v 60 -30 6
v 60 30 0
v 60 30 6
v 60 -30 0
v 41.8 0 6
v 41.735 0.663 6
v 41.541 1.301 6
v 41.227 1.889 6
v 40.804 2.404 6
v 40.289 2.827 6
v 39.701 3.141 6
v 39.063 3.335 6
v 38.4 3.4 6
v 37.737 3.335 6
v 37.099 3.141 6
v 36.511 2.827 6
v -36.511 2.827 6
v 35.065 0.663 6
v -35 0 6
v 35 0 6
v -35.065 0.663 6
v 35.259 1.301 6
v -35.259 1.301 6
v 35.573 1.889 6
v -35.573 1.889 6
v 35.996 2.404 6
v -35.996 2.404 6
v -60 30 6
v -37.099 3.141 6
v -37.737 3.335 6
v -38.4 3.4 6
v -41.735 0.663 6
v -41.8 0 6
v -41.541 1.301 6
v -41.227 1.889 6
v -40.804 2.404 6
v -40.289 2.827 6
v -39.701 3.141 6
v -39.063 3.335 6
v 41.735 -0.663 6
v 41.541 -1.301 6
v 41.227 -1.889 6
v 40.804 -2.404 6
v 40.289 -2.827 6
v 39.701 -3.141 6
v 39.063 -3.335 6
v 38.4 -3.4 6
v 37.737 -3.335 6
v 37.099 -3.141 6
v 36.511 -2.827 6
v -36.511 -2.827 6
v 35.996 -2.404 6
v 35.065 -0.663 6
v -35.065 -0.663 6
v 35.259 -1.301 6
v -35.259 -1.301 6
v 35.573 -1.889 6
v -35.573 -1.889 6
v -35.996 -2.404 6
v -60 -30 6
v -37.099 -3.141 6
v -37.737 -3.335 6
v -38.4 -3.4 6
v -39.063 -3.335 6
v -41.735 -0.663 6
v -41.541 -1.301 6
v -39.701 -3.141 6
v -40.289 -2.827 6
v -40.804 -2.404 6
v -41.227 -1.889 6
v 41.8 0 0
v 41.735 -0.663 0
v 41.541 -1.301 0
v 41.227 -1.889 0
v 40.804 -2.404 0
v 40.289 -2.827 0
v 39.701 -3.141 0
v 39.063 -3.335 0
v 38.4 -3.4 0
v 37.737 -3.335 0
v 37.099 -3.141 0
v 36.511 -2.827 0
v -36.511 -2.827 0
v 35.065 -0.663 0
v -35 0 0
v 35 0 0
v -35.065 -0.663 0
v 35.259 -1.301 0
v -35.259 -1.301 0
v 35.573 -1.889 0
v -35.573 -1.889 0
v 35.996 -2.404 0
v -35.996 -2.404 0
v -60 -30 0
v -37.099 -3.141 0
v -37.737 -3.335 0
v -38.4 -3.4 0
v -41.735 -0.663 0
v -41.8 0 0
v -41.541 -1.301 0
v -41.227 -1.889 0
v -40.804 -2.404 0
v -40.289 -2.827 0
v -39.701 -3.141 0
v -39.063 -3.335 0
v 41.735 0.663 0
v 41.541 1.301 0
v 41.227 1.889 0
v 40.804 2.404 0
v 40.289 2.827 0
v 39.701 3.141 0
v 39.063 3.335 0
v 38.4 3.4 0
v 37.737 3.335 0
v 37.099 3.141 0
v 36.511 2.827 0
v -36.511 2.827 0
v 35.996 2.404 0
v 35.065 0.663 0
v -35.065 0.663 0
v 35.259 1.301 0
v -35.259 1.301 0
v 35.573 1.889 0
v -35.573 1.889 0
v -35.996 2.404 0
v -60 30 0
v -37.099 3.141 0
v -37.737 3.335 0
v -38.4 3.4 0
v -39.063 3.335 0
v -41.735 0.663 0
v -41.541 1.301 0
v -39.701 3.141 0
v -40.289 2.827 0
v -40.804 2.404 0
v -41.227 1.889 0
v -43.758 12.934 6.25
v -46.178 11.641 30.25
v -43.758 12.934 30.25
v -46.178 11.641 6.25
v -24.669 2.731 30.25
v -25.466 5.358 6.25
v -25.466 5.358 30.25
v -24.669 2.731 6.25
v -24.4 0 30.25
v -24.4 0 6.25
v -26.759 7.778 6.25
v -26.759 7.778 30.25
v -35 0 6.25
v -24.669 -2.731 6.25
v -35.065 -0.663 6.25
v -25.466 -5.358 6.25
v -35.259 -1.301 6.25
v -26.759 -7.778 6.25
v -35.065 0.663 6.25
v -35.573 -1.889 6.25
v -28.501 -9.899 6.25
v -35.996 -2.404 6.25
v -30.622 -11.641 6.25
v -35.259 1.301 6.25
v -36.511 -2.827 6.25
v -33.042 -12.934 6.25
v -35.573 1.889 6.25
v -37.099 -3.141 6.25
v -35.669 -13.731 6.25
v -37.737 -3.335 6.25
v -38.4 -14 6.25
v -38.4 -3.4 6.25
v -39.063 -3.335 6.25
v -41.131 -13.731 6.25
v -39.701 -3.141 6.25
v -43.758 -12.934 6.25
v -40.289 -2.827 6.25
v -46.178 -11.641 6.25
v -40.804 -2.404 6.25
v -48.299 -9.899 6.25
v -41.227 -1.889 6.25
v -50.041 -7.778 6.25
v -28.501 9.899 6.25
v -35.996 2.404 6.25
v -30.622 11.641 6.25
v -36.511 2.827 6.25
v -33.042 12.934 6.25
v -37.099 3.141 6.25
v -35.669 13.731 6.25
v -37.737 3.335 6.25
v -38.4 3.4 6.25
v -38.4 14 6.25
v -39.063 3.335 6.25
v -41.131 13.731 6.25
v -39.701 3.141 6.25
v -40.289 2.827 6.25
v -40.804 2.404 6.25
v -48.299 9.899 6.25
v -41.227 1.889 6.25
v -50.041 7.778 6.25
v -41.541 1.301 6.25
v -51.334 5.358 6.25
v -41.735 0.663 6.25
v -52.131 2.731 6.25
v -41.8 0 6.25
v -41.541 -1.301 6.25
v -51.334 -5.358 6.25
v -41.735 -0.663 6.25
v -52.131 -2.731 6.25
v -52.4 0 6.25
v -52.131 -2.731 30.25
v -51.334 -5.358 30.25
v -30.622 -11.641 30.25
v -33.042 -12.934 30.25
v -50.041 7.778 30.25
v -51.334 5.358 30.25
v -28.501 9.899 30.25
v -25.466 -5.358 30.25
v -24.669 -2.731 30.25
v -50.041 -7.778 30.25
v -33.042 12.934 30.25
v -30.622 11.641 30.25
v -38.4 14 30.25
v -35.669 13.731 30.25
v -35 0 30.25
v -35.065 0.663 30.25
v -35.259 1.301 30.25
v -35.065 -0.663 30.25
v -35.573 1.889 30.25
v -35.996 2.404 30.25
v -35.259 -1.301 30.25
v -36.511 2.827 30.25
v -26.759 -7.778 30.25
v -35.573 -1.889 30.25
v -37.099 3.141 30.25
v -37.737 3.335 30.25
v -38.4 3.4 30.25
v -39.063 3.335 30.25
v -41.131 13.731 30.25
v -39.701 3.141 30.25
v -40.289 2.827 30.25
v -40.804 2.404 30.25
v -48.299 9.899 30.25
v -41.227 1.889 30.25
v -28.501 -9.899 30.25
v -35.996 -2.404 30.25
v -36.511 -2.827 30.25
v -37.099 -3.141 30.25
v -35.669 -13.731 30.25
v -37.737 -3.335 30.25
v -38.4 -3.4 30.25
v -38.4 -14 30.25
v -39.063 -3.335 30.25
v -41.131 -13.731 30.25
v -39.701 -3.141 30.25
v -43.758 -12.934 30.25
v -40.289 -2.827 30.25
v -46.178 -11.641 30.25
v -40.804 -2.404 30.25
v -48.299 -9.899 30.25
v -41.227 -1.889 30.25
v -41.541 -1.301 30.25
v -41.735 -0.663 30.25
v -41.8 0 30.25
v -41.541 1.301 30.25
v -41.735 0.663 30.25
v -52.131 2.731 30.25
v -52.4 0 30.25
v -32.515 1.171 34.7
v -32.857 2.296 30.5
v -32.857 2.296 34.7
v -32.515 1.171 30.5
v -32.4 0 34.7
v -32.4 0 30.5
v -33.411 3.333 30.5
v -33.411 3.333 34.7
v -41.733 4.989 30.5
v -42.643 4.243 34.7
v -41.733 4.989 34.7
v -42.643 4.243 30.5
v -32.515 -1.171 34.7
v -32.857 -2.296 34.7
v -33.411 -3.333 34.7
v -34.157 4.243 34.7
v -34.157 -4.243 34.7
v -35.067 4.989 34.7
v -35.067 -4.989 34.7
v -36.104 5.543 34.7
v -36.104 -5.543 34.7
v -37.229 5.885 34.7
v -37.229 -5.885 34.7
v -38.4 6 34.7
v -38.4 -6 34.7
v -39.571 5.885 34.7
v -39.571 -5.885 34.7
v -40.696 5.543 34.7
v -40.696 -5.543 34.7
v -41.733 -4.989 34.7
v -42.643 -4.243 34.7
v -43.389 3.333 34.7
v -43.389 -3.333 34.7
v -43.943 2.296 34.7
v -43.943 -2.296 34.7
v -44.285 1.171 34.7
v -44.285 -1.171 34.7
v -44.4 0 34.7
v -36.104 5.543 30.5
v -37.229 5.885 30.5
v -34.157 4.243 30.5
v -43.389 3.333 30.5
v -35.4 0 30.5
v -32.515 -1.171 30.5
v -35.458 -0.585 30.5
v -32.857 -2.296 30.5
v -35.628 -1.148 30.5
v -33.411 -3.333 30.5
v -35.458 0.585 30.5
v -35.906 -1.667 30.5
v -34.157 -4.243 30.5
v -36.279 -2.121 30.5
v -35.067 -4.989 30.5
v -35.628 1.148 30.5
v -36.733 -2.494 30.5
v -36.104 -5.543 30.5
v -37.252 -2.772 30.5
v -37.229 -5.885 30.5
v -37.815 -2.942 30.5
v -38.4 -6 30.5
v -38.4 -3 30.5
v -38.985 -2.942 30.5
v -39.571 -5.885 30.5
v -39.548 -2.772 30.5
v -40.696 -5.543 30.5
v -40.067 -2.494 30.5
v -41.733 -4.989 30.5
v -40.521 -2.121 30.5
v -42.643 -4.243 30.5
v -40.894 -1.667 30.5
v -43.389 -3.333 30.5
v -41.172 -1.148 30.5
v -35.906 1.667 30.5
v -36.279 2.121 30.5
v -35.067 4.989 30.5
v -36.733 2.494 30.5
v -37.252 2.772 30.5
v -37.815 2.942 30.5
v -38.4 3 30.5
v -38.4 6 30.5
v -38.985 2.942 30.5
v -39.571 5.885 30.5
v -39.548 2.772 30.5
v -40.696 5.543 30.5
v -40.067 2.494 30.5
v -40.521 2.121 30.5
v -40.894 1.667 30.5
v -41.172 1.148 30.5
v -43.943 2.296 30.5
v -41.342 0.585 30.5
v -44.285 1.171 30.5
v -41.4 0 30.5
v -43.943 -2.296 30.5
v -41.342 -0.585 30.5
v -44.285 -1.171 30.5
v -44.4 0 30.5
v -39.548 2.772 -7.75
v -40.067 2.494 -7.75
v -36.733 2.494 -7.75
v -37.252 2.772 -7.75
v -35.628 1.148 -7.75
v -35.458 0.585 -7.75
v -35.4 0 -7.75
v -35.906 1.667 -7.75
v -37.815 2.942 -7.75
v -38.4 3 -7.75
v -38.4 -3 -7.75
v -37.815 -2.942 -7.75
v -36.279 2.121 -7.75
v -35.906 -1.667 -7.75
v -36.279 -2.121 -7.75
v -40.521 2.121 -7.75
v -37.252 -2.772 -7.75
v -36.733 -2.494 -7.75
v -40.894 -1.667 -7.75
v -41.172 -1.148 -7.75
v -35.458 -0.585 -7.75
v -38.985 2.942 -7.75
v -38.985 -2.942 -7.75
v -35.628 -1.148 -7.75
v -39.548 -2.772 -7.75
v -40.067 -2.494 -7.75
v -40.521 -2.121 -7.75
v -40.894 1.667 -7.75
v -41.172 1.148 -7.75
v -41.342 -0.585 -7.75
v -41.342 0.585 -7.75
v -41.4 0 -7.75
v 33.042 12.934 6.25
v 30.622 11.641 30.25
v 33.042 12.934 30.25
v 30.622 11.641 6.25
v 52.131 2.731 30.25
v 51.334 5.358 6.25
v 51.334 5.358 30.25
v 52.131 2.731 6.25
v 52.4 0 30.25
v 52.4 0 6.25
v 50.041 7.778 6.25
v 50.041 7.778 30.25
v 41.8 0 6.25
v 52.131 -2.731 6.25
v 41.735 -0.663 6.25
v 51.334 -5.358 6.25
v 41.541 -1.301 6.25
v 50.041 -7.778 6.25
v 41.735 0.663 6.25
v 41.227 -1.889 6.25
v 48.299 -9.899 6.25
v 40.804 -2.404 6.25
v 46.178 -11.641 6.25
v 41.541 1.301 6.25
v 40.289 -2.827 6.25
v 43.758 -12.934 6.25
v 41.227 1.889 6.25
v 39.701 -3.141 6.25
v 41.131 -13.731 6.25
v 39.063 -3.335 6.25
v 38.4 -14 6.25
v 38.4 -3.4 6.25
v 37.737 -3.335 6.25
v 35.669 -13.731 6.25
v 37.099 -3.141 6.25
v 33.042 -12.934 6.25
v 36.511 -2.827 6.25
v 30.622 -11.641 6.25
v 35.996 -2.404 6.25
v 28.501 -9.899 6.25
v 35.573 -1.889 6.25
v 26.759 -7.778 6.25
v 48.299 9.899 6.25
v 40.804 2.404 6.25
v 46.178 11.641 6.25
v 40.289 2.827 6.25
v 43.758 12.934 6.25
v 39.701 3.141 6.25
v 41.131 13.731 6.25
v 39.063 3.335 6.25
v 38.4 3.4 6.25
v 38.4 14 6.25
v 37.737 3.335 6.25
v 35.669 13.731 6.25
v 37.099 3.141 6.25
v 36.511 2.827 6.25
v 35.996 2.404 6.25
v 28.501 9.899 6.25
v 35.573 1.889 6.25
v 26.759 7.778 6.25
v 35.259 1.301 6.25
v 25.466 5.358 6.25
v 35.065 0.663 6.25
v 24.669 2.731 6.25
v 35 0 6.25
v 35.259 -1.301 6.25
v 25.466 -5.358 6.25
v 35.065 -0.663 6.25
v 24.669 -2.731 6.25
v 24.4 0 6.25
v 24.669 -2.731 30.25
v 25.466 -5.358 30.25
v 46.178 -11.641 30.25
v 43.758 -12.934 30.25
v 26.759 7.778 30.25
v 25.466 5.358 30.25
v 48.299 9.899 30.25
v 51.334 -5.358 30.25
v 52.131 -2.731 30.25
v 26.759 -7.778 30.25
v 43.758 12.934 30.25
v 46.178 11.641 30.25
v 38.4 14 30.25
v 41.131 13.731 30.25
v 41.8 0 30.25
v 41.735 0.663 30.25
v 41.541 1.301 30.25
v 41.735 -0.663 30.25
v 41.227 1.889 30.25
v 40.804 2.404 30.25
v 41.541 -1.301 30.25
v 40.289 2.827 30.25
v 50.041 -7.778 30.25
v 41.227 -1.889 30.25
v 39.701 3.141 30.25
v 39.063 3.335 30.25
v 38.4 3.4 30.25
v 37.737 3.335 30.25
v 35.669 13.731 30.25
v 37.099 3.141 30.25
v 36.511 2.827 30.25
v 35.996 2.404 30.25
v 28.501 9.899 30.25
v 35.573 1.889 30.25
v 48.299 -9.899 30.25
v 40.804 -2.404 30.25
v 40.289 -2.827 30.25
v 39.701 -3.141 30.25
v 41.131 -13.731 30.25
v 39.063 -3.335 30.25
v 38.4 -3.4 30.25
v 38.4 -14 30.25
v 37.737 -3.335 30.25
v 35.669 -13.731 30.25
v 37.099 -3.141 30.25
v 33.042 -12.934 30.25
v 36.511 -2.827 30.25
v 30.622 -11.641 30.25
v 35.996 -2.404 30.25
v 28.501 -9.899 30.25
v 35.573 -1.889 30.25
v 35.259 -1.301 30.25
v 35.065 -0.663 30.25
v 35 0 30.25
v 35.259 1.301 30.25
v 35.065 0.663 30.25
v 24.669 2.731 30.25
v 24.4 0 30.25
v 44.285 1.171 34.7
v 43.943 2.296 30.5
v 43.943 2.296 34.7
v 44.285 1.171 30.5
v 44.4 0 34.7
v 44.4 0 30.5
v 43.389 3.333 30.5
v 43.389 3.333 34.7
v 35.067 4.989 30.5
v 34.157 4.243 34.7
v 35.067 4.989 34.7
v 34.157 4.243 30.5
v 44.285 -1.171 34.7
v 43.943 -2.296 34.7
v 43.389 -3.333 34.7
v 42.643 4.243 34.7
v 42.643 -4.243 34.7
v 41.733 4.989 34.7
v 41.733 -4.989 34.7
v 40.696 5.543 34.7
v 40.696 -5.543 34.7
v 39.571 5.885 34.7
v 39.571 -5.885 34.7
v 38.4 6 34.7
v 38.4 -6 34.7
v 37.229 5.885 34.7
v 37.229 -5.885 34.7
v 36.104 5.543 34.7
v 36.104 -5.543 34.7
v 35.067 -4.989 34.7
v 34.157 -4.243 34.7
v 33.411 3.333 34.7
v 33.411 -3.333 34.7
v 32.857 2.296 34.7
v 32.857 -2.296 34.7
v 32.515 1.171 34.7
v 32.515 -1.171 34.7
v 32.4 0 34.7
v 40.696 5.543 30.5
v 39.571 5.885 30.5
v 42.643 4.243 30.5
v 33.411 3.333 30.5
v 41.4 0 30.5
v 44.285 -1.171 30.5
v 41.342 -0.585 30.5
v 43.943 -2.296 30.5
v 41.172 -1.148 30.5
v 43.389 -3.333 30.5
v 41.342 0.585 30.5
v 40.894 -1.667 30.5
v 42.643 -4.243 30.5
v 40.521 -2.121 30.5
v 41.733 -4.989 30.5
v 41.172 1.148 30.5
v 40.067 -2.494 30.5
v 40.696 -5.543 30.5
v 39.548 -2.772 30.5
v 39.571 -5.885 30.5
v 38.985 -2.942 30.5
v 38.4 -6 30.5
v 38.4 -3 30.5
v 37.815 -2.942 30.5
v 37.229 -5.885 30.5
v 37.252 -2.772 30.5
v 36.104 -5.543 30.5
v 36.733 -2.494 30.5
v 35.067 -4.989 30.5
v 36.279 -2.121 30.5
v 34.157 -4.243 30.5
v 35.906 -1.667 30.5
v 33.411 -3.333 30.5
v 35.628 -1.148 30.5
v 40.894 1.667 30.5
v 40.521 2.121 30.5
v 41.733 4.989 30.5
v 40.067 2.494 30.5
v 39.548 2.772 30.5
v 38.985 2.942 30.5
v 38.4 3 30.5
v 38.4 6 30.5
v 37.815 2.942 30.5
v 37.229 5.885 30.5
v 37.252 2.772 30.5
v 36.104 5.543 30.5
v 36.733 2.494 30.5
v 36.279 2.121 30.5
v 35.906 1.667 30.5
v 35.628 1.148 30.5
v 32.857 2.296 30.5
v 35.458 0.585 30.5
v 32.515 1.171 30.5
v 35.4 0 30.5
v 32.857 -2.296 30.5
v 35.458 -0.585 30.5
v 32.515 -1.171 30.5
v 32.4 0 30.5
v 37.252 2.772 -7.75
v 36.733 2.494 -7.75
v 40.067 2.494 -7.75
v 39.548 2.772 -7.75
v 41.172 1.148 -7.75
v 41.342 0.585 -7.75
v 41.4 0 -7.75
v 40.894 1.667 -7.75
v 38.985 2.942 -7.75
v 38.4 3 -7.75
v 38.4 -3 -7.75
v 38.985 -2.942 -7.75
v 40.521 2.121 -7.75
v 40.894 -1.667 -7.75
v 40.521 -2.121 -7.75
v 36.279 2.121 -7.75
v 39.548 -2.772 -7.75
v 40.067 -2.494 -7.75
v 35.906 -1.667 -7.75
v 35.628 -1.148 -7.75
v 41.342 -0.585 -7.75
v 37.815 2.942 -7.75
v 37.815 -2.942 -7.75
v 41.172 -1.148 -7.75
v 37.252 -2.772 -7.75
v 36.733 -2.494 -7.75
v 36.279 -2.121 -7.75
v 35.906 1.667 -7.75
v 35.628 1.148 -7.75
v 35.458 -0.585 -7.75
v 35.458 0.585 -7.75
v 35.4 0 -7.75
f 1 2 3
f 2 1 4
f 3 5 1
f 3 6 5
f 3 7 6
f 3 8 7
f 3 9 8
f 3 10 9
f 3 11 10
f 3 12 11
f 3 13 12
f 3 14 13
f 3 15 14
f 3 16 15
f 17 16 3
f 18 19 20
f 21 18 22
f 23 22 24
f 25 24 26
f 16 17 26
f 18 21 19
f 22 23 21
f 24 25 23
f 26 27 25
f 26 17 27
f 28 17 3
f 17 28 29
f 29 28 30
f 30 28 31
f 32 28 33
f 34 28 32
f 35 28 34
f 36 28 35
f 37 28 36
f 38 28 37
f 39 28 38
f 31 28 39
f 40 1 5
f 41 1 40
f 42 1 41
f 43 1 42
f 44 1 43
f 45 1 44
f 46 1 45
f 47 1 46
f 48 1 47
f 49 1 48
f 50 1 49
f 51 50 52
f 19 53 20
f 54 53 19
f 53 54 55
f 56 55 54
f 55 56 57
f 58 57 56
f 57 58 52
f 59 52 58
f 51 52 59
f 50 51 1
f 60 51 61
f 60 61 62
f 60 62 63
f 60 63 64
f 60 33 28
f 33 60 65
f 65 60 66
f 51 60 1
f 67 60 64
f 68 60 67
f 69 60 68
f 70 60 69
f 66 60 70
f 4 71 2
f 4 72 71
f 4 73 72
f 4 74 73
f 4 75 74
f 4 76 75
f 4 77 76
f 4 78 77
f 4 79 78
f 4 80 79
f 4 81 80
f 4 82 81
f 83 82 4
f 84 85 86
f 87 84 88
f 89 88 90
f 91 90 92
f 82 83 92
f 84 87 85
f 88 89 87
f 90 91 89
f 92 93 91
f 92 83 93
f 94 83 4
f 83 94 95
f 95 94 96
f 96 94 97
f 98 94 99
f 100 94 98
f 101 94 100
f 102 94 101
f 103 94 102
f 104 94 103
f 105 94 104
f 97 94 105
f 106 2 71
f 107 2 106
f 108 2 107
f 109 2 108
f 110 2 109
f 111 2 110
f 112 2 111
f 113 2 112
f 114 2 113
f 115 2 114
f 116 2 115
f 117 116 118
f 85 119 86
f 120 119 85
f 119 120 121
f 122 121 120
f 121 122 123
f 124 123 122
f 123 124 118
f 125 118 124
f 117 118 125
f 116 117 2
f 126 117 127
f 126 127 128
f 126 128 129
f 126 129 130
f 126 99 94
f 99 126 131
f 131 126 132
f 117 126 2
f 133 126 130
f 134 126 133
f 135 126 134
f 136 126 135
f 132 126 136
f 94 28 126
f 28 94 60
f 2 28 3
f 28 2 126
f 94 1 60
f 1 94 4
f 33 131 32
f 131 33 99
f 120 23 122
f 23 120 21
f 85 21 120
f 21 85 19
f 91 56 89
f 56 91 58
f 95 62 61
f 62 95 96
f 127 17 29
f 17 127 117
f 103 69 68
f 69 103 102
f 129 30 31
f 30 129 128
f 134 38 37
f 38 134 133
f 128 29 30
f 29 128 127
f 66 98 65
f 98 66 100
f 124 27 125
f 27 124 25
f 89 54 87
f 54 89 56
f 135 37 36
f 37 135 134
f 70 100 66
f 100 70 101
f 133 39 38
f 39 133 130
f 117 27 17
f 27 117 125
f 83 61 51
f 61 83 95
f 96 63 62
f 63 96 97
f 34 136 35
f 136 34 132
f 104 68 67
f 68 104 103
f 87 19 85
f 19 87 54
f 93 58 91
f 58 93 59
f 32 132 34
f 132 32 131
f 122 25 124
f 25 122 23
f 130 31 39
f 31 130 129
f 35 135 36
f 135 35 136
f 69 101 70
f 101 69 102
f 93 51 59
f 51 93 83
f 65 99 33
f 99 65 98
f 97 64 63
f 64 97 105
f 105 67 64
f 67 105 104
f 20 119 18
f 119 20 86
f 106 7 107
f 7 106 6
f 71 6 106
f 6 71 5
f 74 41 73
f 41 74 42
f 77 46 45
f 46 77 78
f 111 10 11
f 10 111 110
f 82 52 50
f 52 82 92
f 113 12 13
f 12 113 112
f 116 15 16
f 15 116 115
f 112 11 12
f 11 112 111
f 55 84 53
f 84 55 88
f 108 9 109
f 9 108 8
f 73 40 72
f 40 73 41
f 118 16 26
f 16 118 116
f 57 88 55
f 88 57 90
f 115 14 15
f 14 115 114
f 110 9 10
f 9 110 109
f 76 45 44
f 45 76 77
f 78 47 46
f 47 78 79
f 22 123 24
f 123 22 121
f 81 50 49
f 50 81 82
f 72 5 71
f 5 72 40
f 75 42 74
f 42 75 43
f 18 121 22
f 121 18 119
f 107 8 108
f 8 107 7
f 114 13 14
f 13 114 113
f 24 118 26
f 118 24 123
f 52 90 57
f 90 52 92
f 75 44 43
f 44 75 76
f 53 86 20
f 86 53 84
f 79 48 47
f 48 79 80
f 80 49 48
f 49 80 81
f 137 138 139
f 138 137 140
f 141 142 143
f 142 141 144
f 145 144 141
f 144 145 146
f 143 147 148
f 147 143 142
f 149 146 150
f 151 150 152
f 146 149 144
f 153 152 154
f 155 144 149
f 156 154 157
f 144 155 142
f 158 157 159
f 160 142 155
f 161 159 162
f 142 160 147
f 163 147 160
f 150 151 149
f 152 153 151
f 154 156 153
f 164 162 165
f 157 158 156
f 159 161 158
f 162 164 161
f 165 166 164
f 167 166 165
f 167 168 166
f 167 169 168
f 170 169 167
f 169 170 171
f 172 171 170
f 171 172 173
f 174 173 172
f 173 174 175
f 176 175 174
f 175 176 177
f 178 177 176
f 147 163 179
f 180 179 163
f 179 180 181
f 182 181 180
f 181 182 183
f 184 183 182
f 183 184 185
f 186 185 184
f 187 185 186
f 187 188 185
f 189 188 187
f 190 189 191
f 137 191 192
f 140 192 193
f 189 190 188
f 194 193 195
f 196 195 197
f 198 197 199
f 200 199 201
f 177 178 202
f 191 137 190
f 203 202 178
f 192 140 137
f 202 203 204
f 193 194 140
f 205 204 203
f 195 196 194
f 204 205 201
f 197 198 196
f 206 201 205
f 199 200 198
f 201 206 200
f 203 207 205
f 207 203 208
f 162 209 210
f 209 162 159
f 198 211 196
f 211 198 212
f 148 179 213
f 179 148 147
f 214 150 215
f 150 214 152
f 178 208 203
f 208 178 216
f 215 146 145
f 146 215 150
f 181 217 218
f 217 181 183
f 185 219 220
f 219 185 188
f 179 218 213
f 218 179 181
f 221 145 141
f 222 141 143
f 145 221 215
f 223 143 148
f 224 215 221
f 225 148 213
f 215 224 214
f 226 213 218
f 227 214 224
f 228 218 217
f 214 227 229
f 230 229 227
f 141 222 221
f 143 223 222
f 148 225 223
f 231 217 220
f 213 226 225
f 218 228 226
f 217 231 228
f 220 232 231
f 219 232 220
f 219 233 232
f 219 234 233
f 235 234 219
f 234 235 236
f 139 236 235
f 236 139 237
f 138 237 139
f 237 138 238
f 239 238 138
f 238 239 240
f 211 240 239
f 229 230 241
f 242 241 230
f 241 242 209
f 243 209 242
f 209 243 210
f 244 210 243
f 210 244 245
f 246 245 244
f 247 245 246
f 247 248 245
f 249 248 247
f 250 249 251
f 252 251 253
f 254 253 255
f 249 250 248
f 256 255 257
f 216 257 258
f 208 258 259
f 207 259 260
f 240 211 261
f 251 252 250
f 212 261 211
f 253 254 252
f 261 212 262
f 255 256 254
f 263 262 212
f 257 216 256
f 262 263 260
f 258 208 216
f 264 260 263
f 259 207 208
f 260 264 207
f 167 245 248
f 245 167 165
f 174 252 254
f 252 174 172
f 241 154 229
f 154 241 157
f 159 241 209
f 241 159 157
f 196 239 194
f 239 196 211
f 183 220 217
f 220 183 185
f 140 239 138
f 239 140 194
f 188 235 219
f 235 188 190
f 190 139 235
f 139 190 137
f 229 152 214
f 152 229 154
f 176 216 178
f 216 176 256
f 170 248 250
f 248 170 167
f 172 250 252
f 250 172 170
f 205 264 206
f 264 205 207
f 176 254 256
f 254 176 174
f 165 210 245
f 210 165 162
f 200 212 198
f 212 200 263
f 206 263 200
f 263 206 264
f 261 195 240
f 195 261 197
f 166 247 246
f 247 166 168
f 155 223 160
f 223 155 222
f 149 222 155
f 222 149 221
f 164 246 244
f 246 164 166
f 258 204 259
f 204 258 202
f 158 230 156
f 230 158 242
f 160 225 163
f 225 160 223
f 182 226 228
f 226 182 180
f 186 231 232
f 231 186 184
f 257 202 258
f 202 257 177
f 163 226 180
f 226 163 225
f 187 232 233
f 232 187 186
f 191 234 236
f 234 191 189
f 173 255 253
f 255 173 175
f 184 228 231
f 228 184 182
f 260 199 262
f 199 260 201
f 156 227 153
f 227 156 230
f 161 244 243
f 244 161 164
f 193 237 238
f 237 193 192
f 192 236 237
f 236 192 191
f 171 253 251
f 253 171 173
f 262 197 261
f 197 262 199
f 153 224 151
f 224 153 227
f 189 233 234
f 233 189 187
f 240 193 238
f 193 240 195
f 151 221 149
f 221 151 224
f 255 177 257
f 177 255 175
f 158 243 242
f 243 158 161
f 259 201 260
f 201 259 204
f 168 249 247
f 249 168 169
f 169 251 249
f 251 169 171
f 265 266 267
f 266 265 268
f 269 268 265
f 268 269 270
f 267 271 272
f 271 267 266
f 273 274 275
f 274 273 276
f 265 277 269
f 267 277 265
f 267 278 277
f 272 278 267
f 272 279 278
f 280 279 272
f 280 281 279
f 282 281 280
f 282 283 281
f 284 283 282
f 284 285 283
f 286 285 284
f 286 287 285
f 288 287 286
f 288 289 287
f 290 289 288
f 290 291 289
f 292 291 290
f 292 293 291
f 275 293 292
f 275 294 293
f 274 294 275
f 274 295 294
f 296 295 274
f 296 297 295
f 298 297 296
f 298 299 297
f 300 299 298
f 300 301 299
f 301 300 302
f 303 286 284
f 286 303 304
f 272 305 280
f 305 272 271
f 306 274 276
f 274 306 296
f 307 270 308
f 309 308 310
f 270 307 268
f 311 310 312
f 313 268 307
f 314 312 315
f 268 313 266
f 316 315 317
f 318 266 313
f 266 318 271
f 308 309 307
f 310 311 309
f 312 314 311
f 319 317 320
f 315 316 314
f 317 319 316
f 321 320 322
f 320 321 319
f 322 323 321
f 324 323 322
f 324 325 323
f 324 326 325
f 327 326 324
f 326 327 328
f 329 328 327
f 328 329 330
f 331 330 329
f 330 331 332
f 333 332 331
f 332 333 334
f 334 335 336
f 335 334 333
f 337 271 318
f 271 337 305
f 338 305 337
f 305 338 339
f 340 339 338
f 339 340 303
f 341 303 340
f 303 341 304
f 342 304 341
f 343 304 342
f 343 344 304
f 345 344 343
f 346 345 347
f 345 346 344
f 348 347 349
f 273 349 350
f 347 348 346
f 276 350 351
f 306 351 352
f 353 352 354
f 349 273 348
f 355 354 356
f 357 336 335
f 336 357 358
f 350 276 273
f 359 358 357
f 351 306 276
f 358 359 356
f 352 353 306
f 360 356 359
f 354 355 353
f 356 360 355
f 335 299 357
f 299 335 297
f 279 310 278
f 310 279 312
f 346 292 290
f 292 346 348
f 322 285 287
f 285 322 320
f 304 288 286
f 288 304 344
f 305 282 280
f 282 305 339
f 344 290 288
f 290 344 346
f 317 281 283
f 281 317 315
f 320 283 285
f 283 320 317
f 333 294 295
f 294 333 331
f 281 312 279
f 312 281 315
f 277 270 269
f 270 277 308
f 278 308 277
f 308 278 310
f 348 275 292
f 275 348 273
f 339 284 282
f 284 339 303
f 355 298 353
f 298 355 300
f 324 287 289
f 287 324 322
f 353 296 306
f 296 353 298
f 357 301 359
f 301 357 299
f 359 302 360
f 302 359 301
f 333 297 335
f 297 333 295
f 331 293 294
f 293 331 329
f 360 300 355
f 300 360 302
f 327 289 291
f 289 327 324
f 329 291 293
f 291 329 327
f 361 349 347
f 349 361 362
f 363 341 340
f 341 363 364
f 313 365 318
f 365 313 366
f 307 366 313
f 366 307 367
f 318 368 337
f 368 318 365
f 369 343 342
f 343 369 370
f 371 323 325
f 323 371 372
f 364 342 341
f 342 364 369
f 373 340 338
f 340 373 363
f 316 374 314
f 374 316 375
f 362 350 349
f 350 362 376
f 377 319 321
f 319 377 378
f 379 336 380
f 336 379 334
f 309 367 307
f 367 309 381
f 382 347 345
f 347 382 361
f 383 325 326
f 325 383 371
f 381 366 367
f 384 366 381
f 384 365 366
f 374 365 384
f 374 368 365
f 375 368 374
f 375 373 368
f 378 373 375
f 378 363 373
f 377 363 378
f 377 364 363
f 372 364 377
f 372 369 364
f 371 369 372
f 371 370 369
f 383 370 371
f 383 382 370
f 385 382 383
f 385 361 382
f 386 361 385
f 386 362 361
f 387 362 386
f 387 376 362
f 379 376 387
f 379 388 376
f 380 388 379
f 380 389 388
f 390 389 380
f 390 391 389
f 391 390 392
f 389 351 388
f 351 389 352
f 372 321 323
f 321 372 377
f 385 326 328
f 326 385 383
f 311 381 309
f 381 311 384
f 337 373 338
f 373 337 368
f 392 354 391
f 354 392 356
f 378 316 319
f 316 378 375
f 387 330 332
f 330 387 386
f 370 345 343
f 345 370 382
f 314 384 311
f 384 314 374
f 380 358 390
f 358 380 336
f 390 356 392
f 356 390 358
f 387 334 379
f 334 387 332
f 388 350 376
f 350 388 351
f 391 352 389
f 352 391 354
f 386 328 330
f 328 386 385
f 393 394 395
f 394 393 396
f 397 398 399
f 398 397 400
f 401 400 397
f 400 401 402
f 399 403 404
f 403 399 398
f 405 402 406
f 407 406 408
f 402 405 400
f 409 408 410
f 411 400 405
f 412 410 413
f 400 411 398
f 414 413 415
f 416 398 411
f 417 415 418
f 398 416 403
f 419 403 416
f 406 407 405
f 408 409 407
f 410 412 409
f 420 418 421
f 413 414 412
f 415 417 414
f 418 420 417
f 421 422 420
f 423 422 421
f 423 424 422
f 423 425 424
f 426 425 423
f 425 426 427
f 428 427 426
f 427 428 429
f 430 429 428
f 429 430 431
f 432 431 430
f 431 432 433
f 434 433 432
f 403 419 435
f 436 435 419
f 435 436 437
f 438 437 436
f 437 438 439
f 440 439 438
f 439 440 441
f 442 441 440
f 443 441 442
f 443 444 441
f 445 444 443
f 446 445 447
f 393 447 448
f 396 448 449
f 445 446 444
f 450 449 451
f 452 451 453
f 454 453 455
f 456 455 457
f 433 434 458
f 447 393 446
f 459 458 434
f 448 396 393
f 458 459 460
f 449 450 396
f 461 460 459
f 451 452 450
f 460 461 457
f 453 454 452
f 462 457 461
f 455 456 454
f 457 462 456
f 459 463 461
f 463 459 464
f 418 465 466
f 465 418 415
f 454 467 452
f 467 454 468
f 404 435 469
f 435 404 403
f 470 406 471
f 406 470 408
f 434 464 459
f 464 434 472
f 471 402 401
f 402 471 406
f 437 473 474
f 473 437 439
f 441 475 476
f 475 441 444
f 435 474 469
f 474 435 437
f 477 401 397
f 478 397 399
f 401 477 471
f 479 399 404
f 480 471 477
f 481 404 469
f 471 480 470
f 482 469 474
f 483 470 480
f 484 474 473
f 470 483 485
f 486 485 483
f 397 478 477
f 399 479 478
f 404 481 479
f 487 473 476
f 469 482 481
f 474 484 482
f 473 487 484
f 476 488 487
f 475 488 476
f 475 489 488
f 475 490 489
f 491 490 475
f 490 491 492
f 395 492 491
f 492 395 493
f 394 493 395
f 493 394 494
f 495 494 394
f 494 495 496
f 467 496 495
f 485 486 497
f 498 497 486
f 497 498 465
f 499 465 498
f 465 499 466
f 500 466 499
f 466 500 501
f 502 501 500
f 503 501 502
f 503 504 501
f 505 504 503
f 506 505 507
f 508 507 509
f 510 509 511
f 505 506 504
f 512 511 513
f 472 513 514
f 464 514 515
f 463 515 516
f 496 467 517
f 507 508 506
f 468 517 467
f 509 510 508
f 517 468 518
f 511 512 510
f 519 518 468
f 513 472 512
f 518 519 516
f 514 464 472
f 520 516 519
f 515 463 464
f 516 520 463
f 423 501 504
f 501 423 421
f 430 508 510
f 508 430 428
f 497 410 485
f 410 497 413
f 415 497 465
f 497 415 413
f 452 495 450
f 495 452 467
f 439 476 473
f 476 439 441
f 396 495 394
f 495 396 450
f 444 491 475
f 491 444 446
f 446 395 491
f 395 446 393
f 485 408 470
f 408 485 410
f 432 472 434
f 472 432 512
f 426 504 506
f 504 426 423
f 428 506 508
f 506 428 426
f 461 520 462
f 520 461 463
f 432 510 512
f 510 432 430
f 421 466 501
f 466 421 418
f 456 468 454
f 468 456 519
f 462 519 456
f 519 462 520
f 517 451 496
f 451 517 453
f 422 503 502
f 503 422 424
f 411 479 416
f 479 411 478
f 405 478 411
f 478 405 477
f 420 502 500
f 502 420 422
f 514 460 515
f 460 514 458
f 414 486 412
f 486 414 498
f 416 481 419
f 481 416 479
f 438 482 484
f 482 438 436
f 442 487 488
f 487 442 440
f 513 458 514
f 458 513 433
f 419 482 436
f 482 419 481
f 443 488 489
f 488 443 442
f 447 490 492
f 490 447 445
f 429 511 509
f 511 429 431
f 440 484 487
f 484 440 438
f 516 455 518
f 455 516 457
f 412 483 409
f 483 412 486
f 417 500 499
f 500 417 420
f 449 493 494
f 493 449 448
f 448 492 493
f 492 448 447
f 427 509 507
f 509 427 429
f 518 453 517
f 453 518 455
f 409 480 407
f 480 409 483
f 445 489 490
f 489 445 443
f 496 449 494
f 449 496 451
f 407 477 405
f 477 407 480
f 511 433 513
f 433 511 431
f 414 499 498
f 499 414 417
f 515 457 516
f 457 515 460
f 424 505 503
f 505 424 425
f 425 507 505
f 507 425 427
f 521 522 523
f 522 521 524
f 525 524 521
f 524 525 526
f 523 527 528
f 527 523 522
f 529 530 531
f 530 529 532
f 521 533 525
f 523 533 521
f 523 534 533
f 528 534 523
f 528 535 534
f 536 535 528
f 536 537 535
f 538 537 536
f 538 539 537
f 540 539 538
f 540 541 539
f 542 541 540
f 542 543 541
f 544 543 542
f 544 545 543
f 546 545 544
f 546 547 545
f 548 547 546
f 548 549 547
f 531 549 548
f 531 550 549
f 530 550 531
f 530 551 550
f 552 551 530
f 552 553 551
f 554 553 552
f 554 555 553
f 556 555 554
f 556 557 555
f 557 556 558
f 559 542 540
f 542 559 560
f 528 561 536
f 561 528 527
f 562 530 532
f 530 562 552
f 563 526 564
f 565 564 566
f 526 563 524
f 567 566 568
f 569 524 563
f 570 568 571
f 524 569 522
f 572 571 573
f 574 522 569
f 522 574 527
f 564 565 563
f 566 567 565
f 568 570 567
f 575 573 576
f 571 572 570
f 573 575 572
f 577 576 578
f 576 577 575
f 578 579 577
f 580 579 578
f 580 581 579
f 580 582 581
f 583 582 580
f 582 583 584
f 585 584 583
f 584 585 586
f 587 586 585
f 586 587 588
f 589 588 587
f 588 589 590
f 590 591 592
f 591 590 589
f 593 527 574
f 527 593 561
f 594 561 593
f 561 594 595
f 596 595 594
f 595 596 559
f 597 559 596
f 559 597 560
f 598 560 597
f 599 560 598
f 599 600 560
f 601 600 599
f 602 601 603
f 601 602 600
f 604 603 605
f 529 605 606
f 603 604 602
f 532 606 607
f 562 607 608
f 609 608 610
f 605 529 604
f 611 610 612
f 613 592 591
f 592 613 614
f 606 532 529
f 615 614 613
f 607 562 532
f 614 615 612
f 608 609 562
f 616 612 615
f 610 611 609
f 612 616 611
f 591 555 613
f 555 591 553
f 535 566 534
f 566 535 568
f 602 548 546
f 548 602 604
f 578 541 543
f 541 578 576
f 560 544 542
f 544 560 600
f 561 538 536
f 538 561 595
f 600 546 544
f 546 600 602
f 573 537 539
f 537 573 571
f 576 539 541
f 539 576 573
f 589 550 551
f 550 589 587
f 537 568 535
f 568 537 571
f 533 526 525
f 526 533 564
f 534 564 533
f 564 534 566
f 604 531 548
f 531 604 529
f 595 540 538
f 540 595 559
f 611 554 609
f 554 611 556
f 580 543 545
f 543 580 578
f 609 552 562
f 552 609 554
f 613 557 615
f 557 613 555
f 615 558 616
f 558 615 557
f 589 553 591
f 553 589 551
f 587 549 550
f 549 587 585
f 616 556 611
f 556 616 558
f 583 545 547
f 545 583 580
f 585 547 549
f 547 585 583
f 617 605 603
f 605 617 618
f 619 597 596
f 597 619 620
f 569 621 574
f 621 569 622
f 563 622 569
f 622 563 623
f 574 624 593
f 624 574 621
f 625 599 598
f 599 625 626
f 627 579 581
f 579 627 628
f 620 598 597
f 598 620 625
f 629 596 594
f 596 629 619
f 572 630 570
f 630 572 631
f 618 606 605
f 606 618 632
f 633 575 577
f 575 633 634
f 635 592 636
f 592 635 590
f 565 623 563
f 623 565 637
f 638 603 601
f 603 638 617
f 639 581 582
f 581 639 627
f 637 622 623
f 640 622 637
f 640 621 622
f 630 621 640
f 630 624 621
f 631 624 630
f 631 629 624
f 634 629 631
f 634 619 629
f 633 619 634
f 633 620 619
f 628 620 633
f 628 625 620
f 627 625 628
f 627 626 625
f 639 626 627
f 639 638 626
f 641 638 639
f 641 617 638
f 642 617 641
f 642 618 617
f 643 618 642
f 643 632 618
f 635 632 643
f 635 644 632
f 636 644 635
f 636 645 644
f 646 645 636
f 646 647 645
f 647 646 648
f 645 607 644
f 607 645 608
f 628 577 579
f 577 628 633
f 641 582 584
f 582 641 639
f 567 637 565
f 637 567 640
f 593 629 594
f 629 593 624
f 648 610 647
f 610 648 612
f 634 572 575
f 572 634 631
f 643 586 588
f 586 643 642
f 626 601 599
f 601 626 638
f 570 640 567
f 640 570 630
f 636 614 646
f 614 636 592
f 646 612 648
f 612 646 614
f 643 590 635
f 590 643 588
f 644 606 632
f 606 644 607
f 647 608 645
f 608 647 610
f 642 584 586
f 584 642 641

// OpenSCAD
$fn = 32;

// ------------------------------------------------------------------------
// Standoff columns: 2 d28 standoffs, bolts d6
// Every part is its own module, assembly() places them once.
// ------------------------------------------------------------------------

// --- part 1 ---
module base_plate() {
  difference() {
    translate([-60, -30, 0]) cube([120, 60, 6]);
    translate([-38.4, 0, -1]) cylinder(h = 8, d = 6.8);
    translate([38.4, 0, -1]) cylinder(h = 8, d = 6.8);
  }
}

// --- part 2 ---
module spacer1() {
  difference() {
      translate([0, 0, 0]) cylinder(h = 24, d = 28);
      translate([0, 0, -1]) cylinder(h = 26, d = 6.8);
    }
}

// --- part 3 ---
module bolt1() {
  cylinder(h = 4.2, d = 12);
  translate([0, 0, -38.25]) cylinder(h = 38.25, d = 6);
}

// --- part 4 ---
module spacer2() {
  difference() {
      translate([0, 0, 0]) cylinder(h = 24, d = 28);
      translate([0, 0, -1]) cylinder(h = 26, d = 6.8);
    }
}

// --- part 5 ---
module bolt2() {
  cylinder(h = 4.2, d = 12);
  translate([0, 0, -38.25]) cylinder(h = 38.25, d = 6);
}

// --- assembly ---
module assembly() {
  translate([0, 0, 0]) rotate([0, 0, 0]) base_plate();
  translate([-38.4, 0, 6.25]) rotate([0, 0, 0]) spacer1();
  translate([-38.4, 0, 30.5]) rotate([0, 0, 0]) bolt1();
  translate([38.4, 0, 6.25]) rotate([0, 0, 0]) spacer2();
  translate([38.4, 0, 30.5]) rotate([0, 0, 0]) bolt2();
}

assembly();
